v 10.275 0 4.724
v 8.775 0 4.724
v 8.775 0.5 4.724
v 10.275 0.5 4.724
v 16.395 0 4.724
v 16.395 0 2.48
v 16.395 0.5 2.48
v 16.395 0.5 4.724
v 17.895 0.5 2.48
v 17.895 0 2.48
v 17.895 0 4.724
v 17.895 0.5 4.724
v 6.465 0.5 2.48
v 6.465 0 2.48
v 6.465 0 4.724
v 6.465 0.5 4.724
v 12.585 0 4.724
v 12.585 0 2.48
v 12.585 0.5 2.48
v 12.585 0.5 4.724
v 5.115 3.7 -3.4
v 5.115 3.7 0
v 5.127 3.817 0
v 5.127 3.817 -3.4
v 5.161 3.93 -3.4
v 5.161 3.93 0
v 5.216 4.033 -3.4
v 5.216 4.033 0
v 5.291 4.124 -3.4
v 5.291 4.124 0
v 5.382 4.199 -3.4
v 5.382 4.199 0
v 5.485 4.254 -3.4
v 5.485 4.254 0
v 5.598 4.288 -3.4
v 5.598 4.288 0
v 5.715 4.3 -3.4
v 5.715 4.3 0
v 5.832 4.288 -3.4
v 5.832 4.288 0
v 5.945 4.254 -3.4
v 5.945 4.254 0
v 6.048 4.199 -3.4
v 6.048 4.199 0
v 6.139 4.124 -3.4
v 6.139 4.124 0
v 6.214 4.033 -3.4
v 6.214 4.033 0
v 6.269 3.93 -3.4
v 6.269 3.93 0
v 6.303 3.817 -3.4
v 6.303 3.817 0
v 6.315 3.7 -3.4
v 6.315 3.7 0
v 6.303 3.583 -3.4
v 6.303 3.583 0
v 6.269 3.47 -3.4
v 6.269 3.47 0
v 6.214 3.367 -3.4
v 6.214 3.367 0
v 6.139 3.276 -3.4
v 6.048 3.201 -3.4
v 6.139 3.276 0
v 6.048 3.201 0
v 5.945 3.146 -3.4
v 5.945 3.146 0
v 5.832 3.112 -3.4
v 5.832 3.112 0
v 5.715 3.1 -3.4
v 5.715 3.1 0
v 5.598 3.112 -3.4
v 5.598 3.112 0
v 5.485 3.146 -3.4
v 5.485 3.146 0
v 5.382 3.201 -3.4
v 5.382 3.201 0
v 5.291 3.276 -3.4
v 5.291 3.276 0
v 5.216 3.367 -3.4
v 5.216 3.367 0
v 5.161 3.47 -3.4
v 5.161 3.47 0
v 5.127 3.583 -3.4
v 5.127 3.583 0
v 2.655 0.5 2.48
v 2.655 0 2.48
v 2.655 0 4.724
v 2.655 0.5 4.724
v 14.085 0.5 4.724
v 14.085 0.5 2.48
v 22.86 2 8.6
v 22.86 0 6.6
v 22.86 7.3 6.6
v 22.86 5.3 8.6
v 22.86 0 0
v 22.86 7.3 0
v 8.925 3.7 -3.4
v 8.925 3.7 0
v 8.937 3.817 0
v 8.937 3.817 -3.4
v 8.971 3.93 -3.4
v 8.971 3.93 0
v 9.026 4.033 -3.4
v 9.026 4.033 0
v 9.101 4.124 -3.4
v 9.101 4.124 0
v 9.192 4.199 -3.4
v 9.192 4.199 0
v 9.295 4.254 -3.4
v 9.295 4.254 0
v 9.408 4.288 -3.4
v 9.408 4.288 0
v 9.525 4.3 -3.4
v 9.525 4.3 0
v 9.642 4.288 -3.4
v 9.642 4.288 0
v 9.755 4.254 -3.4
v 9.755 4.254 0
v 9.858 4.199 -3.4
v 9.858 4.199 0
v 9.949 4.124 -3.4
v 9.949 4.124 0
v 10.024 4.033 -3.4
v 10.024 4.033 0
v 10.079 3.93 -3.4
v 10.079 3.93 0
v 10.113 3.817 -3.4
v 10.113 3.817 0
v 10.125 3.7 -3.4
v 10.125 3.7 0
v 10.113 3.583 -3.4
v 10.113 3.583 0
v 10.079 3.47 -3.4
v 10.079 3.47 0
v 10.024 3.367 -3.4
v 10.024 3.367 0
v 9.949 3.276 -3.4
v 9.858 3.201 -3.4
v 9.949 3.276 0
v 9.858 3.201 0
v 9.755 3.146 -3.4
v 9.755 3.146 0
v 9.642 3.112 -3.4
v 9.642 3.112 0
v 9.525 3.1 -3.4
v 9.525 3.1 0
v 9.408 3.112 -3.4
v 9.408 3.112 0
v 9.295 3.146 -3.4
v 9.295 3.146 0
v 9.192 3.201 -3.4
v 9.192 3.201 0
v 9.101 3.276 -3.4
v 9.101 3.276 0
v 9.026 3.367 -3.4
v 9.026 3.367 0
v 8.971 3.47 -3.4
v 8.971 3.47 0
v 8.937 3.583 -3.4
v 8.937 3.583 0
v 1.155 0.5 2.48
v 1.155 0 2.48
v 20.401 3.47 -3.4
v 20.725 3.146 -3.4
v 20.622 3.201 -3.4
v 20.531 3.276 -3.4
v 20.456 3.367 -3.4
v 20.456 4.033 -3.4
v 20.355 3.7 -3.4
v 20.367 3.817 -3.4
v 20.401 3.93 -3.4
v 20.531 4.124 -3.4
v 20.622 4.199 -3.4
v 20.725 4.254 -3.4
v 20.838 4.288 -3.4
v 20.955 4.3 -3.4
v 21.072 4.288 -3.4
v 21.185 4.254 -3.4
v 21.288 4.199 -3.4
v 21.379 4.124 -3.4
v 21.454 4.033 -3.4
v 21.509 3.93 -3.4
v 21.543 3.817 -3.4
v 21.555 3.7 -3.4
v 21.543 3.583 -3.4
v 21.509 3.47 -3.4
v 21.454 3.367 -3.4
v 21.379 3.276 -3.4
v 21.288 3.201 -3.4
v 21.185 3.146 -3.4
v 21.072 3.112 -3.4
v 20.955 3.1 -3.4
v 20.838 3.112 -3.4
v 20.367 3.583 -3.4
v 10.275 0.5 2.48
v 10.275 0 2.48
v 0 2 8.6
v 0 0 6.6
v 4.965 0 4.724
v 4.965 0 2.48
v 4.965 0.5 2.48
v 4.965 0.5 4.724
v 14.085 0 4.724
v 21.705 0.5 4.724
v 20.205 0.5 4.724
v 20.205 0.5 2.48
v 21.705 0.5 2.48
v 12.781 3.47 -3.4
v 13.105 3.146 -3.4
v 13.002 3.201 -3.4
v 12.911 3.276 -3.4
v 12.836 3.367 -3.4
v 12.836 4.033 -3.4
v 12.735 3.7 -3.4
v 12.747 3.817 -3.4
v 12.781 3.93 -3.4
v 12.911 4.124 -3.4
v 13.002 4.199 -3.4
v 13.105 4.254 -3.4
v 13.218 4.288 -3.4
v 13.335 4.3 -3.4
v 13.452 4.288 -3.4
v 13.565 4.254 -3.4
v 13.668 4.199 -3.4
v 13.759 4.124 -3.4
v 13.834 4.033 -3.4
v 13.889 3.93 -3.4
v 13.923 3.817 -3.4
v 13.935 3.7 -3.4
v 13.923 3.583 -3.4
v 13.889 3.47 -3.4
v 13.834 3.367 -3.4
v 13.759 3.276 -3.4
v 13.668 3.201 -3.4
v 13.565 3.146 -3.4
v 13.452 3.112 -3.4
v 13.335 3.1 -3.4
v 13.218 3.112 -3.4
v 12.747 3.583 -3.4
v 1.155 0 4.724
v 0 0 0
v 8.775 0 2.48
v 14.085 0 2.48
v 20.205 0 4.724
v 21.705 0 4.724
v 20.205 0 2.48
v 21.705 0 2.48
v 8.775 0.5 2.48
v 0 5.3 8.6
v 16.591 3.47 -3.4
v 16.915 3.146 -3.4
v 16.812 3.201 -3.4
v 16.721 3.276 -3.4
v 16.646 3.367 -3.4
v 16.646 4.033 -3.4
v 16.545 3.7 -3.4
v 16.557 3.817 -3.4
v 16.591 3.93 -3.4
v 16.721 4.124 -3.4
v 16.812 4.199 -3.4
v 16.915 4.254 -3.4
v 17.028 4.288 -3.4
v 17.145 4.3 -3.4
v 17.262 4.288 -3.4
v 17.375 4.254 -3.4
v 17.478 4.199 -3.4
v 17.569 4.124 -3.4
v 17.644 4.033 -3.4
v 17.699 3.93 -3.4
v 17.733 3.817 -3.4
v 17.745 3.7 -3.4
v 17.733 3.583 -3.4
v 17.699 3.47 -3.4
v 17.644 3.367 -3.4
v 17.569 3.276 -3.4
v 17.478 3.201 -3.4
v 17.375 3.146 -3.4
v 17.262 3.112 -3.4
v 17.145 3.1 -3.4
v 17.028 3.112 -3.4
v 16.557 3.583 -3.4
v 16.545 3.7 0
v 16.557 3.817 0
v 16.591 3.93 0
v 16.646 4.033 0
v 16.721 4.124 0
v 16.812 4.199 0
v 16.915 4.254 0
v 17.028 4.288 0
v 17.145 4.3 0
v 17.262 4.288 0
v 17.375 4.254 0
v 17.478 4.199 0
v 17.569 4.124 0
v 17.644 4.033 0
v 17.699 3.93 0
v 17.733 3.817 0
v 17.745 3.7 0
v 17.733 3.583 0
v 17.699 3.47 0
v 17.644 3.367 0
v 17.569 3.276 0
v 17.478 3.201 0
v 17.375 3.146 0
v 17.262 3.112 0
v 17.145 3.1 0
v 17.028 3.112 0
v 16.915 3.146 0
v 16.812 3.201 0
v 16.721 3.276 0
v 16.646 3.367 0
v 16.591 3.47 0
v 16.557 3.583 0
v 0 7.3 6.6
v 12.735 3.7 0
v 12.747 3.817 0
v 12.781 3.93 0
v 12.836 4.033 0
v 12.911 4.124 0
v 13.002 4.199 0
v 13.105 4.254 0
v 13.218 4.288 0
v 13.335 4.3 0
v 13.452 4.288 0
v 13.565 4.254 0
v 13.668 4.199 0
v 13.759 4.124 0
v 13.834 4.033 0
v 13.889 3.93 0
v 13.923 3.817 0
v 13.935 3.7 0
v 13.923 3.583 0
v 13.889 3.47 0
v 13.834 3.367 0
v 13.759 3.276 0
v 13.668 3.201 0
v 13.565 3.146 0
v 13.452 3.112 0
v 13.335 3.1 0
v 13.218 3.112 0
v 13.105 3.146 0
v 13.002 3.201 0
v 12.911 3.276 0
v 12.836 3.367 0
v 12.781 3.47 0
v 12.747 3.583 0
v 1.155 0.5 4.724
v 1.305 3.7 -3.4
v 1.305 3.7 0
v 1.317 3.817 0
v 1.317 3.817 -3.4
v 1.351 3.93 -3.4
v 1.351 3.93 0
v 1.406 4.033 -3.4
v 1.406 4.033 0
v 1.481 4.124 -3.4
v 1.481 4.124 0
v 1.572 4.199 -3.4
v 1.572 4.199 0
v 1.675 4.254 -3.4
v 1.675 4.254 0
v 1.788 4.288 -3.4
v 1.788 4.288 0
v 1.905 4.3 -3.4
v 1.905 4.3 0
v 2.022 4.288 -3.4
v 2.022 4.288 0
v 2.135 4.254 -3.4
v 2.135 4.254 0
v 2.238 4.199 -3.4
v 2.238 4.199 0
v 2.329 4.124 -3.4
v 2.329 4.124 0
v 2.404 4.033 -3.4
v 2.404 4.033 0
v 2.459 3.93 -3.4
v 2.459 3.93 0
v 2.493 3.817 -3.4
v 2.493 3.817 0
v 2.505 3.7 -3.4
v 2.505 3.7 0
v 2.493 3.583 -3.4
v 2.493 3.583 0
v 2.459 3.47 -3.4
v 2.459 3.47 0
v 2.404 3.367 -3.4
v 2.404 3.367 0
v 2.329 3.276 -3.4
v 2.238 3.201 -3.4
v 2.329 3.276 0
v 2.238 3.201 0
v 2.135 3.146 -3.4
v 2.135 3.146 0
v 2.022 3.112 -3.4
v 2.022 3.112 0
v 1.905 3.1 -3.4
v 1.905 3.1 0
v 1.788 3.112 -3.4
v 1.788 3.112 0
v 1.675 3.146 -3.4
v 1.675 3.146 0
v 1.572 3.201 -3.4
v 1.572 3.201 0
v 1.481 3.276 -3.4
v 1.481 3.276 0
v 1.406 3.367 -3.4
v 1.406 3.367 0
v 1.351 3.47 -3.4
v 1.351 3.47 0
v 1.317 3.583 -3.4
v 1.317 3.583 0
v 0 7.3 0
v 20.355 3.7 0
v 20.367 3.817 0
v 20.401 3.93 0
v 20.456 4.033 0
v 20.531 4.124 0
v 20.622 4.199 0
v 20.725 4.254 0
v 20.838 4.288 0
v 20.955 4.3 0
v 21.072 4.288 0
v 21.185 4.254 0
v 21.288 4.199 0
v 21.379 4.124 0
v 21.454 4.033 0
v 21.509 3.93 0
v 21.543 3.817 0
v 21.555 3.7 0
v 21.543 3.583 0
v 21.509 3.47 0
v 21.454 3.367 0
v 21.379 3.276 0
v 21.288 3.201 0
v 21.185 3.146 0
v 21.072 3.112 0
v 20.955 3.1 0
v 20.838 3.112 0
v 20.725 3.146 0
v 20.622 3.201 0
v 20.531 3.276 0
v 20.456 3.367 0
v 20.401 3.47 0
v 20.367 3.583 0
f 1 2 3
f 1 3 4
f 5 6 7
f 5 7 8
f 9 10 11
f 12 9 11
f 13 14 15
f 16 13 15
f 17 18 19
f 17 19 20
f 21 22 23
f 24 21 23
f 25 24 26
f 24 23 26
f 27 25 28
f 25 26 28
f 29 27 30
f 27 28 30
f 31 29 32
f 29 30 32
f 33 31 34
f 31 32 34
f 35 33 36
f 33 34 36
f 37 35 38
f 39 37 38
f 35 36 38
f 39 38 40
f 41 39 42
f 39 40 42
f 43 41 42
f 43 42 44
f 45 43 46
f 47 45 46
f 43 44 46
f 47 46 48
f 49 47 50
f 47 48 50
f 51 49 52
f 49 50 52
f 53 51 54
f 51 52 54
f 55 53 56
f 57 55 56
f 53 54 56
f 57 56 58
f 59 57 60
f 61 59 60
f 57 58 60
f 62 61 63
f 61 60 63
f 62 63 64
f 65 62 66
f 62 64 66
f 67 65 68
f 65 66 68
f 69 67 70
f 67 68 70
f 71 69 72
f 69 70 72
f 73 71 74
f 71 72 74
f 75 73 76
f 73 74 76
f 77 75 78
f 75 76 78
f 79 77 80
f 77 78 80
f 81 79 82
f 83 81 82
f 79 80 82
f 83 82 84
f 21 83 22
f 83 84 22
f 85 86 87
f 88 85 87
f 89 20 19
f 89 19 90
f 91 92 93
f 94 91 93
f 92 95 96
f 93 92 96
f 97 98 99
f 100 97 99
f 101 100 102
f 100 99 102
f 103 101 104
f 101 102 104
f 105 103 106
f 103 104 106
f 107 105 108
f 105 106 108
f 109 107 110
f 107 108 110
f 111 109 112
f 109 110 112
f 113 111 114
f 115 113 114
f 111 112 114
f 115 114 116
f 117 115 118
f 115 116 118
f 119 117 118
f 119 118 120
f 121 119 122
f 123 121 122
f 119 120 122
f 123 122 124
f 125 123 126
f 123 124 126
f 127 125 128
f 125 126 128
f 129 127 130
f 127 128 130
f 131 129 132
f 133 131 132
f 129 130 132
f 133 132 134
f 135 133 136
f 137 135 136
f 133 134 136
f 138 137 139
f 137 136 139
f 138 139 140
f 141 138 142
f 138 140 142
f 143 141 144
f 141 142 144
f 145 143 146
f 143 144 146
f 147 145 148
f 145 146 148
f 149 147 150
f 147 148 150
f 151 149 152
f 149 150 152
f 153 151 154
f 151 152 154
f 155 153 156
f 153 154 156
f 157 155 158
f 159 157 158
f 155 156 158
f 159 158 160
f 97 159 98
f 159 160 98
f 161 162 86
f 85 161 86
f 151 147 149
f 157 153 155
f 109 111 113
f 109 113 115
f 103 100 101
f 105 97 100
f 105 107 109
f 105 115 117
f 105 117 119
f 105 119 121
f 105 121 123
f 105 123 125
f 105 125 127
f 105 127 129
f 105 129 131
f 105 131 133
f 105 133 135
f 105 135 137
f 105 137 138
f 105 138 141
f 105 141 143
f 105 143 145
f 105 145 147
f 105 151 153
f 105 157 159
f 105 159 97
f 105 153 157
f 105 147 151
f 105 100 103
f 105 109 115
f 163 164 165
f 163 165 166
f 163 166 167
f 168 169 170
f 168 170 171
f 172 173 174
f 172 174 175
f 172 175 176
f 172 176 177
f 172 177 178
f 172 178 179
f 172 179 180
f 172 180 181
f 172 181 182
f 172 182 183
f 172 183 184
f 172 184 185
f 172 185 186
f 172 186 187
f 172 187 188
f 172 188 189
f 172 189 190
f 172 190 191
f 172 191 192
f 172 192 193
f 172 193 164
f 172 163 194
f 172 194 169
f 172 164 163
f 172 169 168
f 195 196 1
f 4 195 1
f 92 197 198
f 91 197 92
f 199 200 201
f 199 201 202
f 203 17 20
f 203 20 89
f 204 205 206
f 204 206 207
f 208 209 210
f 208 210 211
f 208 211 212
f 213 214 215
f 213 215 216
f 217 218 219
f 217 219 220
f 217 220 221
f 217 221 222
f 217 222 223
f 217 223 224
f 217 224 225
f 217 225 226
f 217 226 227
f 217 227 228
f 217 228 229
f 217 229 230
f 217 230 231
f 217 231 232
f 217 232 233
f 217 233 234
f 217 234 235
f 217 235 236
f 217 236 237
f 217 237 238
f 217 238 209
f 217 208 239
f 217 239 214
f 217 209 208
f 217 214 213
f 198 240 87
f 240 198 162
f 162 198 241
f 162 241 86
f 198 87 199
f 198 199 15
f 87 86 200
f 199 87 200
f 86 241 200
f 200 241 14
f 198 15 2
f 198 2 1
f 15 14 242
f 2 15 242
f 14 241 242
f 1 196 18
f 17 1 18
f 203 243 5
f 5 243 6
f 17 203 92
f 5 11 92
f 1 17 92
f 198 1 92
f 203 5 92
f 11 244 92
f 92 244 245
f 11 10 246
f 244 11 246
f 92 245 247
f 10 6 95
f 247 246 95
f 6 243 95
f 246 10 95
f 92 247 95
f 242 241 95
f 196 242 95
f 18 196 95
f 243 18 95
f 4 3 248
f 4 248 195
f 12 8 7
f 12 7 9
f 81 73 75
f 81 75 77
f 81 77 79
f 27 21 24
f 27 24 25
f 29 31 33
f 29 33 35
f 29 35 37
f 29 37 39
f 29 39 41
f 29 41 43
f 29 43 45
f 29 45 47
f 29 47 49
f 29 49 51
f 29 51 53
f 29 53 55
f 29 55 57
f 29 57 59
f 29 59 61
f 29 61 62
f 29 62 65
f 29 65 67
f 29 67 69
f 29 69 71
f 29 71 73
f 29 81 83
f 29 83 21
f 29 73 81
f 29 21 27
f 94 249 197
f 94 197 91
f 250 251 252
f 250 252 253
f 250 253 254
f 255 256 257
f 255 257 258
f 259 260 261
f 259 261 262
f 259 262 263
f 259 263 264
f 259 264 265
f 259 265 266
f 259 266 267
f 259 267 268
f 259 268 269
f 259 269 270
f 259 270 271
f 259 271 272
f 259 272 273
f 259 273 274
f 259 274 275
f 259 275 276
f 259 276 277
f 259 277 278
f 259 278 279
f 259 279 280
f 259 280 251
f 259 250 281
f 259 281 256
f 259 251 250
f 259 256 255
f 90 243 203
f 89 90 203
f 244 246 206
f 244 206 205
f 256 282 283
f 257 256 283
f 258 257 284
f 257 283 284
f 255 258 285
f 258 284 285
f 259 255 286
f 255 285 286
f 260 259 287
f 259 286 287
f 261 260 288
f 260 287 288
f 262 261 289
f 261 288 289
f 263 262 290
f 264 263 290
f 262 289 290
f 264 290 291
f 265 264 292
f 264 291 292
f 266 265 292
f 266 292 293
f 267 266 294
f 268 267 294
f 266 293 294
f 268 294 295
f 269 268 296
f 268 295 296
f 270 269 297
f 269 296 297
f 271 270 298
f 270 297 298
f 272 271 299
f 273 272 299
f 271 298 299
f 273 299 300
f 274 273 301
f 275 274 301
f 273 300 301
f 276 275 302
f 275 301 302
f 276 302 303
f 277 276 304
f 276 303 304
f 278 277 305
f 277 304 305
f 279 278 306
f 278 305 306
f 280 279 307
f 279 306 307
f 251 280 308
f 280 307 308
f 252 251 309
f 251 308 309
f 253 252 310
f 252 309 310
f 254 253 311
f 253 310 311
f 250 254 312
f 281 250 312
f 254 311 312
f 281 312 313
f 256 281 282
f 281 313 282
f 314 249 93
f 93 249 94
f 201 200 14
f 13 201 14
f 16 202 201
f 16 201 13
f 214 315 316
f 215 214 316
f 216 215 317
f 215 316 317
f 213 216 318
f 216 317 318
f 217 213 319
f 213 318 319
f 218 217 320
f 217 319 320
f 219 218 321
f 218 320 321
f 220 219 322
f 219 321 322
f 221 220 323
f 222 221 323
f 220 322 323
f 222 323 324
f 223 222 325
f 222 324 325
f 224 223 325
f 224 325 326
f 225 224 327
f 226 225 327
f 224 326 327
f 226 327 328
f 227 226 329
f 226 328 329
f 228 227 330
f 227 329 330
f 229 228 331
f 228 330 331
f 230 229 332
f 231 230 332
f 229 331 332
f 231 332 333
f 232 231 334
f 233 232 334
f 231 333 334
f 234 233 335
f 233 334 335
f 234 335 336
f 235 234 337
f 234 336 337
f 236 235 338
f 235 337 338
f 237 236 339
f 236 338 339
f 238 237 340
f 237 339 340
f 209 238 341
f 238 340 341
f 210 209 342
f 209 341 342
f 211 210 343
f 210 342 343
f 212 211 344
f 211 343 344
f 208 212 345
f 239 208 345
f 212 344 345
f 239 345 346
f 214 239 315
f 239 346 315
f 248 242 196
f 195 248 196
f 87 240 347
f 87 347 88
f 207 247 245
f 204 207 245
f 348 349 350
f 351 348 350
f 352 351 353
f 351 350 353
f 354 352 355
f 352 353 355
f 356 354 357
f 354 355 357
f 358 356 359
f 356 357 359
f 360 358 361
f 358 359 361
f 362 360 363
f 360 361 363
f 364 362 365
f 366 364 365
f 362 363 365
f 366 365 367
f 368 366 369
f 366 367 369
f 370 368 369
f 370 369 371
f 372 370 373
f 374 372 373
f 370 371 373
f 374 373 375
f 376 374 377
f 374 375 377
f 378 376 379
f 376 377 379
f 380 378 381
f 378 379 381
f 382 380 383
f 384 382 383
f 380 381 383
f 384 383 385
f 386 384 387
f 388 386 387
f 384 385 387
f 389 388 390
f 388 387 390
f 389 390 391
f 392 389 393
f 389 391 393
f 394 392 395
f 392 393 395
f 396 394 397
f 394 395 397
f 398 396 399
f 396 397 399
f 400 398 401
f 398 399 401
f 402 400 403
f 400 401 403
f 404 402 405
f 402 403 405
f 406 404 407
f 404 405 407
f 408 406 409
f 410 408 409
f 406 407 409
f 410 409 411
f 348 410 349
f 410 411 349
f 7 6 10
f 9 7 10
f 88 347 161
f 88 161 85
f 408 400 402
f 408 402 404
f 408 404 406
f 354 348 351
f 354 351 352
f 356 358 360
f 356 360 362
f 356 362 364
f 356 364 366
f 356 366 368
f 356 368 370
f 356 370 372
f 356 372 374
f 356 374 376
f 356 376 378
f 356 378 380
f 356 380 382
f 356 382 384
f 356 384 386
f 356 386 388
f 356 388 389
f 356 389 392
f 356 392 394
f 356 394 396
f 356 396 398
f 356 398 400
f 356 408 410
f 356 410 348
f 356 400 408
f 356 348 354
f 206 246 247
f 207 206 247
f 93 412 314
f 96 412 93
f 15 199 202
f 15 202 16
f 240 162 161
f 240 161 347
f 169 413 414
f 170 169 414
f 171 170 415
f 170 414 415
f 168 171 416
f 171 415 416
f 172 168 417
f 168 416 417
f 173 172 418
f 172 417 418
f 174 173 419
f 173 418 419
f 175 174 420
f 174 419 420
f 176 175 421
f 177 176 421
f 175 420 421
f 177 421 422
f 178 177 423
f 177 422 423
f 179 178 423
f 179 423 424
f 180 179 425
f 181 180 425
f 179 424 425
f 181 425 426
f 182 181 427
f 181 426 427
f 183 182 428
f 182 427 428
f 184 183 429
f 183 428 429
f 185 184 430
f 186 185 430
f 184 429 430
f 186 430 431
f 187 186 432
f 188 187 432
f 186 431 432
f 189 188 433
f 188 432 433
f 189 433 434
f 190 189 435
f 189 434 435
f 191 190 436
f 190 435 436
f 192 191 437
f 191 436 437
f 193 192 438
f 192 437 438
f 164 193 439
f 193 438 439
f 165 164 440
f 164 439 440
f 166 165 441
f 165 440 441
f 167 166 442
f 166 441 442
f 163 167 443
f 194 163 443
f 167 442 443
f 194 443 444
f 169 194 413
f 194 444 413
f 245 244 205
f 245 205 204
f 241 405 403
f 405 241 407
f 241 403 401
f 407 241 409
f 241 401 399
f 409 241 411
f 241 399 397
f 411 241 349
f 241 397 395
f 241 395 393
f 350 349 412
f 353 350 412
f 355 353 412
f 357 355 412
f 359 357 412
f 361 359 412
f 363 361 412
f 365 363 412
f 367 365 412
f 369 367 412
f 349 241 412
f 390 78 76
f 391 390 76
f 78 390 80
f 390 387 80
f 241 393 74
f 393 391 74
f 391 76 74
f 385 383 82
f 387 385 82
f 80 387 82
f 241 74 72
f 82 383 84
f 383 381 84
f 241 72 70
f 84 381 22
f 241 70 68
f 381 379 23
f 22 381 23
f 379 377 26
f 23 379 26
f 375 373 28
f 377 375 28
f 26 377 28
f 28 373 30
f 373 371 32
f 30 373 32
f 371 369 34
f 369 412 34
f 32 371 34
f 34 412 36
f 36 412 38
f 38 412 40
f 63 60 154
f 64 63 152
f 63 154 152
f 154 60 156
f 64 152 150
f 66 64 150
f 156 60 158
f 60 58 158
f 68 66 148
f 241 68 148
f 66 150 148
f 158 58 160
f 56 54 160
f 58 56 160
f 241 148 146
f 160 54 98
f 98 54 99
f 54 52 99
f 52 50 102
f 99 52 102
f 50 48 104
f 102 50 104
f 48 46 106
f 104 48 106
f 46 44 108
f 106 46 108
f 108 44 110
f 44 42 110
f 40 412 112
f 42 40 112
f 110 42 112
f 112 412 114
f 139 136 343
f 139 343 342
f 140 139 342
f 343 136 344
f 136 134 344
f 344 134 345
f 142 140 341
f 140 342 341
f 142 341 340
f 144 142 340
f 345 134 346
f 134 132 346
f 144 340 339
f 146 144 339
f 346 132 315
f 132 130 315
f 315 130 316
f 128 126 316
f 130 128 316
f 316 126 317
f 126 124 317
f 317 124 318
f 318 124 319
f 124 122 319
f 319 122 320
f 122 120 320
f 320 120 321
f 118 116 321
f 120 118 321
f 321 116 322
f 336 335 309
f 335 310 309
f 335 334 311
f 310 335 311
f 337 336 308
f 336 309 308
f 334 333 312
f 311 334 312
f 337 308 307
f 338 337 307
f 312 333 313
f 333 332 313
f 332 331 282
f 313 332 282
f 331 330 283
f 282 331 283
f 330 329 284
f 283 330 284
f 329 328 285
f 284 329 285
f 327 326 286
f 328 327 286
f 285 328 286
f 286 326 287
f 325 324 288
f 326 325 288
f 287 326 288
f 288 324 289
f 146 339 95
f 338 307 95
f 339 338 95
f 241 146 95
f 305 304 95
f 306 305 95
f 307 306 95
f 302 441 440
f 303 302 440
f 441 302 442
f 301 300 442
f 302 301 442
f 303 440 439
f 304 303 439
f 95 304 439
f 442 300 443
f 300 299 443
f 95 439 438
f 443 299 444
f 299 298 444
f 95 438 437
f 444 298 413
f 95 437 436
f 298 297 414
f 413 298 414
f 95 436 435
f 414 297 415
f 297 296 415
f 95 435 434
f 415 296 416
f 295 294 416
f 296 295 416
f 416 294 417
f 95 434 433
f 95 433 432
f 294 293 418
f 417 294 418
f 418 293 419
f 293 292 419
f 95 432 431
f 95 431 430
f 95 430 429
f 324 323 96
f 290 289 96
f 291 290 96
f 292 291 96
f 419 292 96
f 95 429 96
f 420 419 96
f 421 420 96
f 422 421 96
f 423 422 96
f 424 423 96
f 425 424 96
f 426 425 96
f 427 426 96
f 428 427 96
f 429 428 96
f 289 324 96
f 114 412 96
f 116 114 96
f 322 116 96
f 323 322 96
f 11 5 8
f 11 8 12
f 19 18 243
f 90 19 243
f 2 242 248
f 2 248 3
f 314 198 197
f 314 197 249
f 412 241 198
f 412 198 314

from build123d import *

# Parameters (mm, degrees)
SKETCH_1_W                 = 22.86
SKETCH_1_H                 = 7.3
EXTRUDE_1_DEPTH            = 8.6
CHAMFER_1_SIZE             = 2
SKETCH_2_W                 = 1.5
SKETCH_2_H                 = 2.244760595
CUT_EXTRUDE_1_DEPTH        = 0.5
PATTERN_LINEAR_1_COUNT     = 3
PATTERN_LINEAR_1_PITCH     = 3.81
PATTERN_LINEAR_1_COL_COUNT = 4
PATTERN_LINEAR_1_COL_PITCH = 3.81
SKETCH_3_R                 = 0.6
EXTRUDE_2_DEPTH            = 3.4
PATTERN_LINEAR_2_COUNT     = 4
PATTERN_LINEAR_2_PITCH     = 3.81
PATTERN_LINEAR_2_COL_COUNT = 3
PATTERN_LINEAR_2_COL_PITCH = 3.81
PATTERN_LINEAR_3_COUNT     = 2
PATTERN_LINEAR_3_PITCH     = 3.81


with BuildPart() as part:
    # 草图1 → 凸台-拉伸1 (new body)
    with BuildSketch(Plane.XY):
        with Locations((11.43, 3.65)):
            Rectangle(SKETCH_1_W, SKETCH_1_H)
    extrude(amount=EXTRUDE_1_DEPTH)

    # 倒角1
    chamfer_1_edges = [part.edges().sort_by_distance(p)[0] for p in [
        (11.43, 7.3, 8.6),
        (11.43, 0, 8.6),
    ]]
    chamfer(chamfer_1_edges, length=CHAMFER_1_SIZE)

    # 草图2 → 切除-拉伸1 (cut)
    with BuildSketch(Plane.XZ):
        with Locations((13.335, 3.602057757)):
            Rectangle(SKETCH_2_W, SKETCH_2_H)
    cut_extrude_1 = extrude(amount=-CUT_EXTRUDE_1_DEPTH, mode=Mode.SUBTRACT)

    # 阵列(线性)1: 切除-拉伸1 ×3
    with Locations(*[(i * PATTERN_LINEAR_1_PITCH, 0, 0) for i in range(1, PATTERN_LINEAR_1_COUNT)]):
        add(cut_extrude_1, mode=Mode.SUBTRACT)

    # 阵列(线性)1 col: 切除-拉伸1 ×4
    with Locations(*[(-i * PATTERN_LINEAR_1_COL_PITCH, 0, 0) for i in range(1, PATTERN_LINEAR_1_COL_COUNT)]):
        add(cut_extrude_1, mode=Mode.SUBTRACT)

    # 草图3 → 凸台-拉伸2 (add)
    with BuildSketch(Plane(origin=(0, 0, 0), x_dir=(-1, 0, 0), z_dir=(0, 0, -1))):
        with Locations((-13.335, 3.7)):
            Circle(SKETCH_3_R)
    extrude_2 = extrude(amount=EXTRUDE_2_DEPTH)

    # 阵列(线性)2: 凸台-拉伸2 ×4
    with Locations(*[(-i * PATTERN_LINEAR_2_PITCH, 0, 0) for i in range(1, PATTERN_LINEAR_2_COUNT)]):
        add(extrude_2)

    # 阵列(线性)2 col: 凸台-拉伸2 ×3
    with Locations(*[(i * PATTERN_LINEAR_2_COL_PITCH, 0, 0) for i in range(1, PATTERN_LINEAR_2_COL_COUNT)]):
        add(extrude_2)

    # 阵列(线性)3: 凸台-拉伸2 ×2
    with Locations(*[(-i * PATTERN_LINEAR_3_PITCH, 0, 0) for i in range(1, PATTERN_LINEAR_3_COUNT)]):
        add(extrude_2)


solid = part.part
